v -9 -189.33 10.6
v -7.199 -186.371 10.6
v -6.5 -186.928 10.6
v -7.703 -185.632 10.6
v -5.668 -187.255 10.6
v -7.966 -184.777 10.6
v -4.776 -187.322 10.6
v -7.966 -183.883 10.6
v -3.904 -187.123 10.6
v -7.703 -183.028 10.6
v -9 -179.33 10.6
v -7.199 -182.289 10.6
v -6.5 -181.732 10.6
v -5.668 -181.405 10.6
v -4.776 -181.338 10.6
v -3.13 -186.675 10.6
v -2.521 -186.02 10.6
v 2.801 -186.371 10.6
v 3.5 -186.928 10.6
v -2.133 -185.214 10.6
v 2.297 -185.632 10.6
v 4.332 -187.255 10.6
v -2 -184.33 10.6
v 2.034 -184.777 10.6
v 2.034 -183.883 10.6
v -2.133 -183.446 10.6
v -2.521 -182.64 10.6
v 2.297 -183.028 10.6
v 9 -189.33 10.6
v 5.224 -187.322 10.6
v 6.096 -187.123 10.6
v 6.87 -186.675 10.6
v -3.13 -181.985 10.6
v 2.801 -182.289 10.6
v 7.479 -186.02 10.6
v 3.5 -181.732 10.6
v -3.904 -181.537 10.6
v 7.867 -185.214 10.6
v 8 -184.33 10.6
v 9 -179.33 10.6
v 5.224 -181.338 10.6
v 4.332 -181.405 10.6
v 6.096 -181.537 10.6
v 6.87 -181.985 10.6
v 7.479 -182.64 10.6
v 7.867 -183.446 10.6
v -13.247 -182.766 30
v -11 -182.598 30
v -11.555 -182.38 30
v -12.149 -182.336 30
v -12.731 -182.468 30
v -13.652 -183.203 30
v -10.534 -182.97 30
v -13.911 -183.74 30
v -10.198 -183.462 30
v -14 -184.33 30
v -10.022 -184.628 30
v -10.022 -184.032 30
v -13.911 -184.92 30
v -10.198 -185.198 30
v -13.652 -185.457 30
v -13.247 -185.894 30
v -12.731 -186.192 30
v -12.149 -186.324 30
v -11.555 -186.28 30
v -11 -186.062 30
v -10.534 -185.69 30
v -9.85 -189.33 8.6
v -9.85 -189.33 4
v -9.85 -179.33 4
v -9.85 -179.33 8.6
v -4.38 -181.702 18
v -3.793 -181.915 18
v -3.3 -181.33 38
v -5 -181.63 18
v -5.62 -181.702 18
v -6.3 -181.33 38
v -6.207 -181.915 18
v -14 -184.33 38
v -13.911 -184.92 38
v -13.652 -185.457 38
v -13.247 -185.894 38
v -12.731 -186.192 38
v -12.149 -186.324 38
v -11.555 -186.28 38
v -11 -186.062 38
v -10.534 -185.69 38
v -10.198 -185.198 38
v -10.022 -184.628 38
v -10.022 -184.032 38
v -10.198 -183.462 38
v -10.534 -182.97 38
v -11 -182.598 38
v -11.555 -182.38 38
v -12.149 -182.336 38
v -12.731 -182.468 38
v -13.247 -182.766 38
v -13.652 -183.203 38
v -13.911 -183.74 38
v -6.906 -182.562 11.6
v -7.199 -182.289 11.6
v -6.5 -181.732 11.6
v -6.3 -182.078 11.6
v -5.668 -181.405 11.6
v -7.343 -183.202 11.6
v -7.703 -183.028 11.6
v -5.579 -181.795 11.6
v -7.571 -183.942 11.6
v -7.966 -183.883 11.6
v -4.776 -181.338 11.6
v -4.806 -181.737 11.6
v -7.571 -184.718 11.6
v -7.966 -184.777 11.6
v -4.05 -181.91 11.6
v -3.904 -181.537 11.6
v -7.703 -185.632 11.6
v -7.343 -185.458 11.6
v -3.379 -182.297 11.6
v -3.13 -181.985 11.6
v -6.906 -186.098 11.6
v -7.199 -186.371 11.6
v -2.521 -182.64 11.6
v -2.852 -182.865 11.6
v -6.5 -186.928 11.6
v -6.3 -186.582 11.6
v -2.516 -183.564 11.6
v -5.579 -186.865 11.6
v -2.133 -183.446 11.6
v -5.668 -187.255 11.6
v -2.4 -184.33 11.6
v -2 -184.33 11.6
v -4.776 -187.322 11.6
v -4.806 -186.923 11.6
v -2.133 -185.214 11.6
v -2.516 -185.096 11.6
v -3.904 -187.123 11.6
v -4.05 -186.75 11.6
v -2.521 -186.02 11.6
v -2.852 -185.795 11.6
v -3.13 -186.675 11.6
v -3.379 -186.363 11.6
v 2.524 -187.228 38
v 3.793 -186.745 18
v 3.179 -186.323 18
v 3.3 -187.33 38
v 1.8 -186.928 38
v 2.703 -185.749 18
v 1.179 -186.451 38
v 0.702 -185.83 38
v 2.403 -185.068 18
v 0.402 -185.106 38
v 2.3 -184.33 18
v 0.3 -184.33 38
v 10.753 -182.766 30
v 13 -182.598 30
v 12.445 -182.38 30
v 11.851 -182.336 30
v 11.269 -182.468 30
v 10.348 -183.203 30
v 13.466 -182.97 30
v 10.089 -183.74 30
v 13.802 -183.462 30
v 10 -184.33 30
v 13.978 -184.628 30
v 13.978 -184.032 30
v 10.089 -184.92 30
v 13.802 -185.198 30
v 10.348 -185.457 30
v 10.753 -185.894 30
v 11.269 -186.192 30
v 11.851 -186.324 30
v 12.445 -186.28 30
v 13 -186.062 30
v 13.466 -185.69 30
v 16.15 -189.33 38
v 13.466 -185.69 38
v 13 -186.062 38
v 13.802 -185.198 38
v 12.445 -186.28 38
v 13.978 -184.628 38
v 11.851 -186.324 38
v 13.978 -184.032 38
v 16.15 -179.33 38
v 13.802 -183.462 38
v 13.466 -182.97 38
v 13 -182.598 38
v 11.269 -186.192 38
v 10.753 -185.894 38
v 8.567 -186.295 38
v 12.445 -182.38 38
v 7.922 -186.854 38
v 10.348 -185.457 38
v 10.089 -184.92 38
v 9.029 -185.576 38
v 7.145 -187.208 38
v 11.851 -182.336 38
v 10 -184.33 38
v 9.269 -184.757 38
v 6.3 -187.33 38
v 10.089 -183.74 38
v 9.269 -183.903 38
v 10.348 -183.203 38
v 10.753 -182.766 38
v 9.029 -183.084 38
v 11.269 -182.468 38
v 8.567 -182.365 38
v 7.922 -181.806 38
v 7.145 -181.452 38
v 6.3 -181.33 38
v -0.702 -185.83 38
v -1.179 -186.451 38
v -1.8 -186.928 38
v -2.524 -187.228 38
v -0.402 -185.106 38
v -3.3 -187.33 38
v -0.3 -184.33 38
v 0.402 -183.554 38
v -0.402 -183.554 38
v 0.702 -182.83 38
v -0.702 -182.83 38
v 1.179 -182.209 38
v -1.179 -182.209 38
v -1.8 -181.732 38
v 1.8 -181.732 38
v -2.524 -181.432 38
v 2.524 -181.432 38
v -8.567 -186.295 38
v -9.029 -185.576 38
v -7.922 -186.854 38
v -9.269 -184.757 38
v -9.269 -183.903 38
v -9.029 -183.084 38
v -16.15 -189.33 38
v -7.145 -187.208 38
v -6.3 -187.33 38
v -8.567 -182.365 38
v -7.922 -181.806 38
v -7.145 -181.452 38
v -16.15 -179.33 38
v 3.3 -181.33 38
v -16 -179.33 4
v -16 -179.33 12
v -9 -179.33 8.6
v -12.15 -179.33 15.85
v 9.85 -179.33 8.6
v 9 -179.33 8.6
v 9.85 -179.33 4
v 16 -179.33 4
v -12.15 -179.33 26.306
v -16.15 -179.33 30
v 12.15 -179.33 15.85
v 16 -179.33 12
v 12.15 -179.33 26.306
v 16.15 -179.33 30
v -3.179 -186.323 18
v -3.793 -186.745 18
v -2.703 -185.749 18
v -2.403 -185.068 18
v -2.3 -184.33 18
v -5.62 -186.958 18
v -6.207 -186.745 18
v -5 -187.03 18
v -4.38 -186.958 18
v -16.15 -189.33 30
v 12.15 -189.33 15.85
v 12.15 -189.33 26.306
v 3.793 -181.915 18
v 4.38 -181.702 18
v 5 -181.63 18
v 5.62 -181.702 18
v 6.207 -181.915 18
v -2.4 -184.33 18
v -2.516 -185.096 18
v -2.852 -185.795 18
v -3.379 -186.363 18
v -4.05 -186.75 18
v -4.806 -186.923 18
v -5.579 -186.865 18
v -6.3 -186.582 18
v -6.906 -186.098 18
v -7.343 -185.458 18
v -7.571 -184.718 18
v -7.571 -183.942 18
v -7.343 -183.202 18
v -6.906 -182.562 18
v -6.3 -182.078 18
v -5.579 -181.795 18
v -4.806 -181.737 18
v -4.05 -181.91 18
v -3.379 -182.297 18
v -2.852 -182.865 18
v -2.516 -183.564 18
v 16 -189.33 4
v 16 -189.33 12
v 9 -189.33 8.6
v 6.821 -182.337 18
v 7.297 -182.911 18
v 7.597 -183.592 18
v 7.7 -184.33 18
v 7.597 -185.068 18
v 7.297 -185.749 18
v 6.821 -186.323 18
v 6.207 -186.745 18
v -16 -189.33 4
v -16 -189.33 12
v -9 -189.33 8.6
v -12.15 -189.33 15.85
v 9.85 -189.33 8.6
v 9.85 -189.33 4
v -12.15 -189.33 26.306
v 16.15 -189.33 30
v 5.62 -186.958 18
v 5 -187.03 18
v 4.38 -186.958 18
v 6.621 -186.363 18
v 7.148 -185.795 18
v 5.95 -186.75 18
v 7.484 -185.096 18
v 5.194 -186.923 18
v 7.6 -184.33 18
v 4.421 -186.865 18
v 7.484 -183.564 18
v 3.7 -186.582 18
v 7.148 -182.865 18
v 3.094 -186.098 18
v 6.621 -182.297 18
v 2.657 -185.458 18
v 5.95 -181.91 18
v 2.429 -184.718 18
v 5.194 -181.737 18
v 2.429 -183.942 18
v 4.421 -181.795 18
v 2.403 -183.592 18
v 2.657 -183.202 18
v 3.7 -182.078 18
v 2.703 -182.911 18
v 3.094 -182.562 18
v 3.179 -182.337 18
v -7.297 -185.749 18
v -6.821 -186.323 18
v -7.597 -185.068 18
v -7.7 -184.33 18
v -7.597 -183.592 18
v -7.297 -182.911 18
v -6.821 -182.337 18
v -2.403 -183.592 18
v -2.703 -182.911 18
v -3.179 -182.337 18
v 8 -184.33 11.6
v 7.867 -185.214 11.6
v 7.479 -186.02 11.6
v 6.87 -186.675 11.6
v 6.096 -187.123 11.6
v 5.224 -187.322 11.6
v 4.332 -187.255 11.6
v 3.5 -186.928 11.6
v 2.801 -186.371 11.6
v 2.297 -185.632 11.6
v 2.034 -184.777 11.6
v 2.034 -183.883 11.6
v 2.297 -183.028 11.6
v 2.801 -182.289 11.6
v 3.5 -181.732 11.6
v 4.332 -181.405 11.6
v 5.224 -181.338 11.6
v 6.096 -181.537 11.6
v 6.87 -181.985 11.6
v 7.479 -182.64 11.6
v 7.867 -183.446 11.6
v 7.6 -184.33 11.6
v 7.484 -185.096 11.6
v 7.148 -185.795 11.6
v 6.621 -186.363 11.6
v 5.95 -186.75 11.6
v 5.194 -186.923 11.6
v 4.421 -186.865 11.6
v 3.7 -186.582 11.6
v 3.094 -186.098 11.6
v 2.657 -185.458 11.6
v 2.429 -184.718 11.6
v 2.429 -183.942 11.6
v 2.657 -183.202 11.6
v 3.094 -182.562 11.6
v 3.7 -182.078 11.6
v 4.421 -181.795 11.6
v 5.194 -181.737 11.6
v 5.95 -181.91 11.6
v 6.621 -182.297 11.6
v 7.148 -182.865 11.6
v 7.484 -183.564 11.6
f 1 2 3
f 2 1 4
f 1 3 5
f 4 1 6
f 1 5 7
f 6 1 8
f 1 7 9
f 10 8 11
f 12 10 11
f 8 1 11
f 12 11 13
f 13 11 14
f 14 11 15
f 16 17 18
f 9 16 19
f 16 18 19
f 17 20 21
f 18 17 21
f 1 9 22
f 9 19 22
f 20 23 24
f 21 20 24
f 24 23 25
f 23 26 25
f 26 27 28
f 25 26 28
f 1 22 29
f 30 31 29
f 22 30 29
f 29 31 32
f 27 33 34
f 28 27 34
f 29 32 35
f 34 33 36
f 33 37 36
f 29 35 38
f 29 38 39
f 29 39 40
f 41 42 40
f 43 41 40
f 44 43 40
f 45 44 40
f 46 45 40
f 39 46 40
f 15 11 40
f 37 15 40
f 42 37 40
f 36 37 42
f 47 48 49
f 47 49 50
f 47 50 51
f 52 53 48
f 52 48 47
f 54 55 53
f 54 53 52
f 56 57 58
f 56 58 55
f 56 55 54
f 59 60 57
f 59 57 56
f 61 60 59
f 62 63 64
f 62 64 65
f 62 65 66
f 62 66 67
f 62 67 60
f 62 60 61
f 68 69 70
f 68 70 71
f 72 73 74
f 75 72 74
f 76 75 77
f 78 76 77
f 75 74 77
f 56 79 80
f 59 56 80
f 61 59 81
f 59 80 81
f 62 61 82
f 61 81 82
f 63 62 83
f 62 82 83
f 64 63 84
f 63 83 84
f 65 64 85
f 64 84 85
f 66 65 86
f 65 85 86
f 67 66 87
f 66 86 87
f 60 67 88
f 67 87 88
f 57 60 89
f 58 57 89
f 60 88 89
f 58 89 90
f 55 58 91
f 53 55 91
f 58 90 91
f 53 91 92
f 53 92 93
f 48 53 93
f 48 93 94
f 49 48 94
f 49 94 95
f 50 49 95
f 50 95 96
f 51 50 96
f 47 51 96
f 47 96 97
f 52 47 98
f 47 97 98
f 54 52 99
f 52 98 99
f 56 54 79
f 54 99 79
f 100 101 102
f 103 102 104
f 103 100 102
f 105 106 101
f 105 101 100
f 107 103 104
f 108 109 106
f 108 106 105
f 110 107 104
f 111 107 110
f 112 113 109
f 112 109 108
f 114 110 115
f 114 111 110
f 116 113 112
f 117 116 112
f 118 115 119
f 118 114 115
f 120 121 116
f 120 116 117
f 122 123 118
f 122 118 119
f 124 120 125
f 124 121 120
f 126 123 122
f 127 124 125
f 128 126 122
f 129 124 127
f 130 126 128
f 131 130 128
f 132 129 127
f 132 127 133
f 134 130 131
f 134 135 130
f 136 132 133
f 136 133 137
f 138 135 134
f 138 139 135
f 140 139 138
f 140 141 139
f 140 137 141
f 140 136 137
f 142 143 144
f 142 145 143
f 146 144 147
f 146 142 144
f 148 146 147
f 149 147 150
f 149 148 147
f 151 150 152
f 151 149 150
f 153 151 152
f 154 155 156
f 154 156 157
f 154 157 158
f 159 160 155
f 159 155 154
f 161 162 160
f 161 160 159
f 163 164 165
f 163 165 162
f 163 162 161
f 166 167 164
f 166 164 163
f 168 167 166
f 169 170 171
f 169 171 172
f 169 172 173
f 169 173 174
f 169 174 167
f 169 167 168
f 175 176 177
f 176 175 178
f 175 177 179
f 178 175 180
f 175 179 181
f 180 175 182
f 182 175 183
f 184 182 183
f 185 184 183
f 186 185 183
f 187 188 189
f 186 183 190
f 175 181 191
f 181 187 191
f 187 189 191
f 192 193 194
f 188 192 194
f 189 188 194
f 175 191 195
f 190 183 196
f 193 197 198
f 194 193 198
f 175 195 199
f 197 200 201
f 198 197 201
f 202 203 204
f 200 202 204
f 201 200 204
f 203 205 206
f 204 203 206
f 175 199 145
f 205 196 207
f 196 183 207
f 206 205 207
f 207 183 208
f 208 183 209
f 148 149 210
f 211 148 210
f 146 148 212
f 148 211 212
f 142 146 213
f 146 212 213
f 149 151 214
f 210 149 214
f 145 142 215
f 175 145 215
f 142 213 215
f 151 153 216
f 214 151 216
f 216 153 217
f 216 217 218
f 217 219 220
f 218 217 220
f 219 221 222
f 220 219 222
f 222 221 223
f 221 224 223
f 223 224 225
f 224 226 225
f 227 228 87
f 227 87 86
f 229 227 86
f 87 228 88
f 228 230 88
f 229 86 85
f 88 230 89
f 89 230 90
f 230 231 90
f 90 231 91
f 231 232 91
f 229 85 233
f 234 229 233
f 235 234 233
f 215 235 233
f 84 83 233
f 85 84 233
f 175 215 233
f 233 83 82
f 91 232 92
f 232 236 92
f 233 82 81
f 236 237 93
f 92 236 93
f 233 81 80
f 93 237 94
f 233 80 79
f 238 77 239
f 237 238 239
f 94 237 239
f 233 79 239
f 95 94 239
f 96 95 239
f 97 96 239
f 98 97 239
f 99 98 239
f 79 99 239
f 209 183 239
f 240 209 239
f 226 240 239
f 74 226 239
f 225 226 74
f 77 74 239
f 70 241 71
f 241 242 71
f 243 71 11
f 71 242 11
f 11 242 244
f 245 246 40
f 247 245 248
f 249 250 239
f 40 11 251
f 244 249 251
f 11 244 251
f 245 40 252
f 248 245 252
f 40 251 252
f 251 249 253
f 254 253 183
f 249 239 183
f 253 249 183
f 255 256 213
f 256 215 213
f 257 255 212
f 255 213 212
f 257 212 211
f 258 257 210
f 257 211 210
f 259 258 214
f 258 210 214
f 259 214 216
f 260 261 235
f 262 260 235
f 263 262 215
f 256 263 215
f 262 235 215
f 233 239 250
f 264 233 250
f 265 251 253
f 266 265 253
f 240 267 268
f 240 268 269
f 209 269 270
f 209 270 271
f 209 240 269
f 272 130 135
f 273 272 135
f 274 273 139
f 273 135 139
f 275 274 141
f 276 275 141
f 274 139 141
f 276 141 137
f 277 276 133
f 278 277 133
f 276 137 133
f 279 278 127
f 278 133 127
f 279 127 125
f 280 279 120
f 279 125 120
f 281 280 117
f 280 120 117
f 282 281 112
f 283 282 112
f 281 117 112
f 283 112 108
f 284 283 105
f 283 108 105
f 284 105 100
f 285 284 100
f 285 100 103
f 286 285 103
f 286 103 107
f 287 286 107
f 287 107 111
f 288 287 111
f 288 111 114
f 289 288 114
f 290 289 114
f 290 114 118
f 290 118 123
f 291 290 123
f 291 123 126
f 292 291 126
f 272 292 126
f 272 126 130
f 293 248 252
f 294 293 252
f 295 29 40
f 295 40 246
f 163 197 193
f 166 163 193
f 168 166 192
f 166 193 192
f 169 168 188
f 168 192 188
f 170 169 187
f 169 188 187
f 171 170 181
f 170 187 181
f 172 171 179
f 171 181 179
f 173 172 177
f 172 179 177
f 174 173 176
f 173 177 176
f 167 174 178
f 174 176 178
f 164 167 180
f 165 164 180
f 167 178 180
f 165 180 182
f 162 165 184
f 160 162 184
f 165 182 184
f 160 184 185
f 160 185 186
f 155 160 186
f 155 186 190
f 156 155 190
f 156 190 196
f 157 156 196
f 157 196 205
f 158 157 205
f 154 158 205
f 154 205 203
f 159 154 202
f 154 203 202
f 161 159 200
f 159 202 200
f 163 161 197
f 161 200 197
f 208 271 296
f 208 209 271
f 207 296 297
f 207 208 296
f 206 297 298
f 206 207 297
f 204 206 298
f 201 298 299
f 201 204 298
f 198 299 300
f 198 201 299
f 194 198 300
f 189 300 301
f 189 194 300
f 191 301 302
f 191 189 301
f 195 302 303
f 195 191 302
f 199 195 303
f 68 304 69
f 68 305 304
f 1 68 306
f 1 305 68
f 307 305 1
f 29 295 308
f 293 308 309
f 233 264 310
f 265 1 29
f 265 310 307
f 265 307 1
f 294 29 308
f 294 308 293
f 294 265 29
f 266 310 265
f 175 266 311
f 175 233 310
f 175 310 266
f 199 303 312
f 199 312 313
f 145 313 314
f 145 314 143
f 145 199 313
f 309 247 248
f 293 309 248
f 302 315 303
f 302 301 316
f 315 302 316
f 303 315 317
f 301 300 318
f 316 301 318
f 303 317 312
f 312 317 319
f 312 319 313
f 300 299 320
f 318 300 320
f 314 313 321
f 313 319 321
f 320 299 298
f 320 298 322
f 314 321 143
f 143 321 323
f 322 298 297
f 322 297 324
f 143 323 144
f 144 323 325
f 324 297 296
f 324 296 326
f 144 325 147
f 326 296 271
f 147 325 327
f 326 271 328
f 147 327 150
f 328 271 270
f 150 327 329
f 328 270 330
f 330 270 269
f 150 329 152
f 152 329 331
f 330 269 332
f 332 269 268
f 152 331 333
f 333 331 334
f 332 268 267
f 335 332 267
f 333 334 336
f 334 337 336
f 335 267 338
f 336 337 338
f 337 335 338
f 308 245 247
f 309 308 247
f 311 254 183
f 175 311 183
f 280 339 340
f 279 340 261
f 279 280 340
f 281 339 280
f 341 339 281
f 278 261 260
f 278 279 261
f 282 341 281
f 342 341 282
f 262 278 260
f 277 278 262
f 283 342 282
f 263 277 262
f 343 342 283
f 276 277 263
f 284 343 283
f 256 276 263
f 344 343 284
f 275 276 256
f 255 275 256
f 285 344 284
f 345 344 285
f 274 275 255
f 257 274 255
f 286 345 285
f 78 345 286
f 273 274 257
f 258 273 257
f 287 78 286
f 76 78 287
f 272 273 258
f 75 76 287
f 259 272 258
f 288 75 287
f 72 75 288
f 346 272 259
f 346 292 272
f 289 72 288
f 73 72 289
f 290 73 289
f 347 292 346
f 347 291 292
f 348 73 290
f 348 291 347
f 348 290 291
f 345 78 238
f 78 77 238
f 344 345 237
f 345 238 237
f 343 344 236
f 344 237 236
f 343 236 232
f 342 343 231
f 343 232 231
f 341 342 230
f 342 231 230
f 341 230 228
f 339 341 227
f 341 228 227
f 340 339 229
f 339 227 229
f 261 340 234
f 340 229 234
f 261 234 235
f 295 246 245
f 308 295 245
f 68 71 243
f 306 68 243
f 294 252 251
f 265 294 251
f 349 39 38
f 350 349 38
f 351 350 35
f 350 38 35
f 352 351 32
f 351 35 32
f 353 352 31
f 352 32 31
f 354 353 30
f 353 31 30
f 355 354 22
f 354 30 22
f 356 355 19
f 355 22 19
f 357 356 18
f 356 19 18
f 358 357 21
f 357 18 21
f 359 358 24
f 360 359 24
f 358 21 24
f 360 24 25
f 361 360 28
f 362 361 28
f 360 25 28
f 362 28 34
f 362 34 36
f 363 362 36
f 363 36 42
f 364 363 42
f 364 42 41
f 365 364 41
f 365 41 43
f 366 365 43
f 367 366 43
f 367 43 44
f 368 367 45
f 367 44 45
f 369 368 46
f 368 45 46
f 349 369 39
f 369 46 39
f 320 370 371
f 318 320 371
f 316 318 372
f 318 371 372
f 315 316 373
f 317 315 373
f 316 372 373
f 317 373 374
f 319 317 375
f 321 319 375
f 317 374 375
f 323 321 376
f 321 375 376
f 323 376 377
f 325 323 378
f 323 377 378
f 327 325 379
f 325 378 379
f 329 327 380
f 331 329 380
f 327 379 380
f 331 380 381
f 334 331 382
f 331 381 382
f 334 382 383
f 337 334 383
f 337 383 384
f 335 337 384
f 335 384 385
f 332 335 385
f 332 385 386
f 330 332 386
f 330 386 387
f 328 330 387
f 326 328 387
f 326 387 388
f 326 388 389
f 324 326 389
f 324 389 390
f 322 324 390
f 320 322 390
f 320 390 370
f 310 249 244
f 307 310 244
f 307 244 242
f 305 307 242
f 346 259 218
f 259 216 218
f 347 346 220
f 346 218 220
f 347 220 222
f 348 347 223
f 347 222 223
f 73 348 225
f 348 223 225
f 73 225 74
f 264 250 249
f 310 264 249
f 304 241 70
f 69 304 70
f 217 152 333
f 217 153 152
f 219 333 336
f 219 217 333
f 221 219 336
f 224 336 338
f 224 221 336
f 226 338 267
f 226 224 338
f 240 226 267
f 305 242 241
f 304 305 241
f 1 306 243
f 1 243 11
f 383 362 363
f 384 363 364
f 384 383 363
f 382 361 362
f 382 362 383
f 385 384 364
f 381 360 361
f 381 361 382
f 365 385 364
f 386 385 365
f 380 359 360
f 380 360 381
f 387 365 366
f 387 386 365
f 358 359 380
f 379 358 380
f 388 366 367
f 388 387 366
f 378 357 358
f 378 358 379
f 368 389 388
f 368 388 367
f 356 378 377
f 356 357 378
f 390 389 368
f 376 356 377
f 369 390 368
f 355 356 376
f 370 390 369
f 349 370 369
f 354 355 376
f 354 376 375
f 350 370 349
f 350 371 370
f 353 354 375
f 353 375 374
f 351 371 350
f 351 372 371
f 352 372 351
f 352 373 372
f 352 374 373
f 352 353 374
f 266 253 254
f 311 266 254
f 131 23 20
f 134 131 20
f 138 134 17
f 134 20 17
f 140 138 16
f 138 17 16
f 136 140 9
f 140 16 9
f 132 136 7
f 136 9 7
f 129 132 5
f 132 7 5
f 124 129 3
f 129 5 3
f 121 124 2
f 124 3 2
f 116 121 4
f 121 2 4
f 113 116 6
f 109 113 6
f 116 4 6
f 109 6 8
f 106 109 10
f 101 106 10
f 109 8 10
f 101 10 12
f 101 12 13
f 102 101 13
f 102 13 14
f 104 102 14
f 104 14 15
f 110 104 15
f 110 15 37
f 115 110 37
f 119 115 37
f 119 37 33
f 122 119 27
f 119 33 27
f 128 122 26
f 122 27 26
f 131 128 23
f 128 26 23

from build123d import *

# Parameters (mm, degrees)
SKETCH072_R     = 2.7
PAD031_DEPTH    = 10
SKETCH069_R     = 2.6
POCKET028_DEPTH = 8
SKETCH070_R     = 3
POCKET029_DEPTH = 1
SKETCH073_R     = 2
POCKET030_DEPTH = 8


with BuildPart() as loft004:
    # Sketch072 → Loft004 section 0
    with BuildSketch(Plane.XY.offset(18)):
        with Locations((-5, 0)):
            Circle(SKETCH072_R)
    # Sketch071 → Loft004 section 1
    with BuildSketch(Plane.XY.offset(38)):
        with BuildLine():
            ThreePointArc((-6.3, 3), (-9.3, 0), (-6.3, -3))
            Line((-6.3, -3), (-3.3, -3))
            ThreePointArc((-3.3, -3), (-0.3, 0), (-3.3, 3))
            Line((-3.3, 3), (-6.3, 3))
        make_face()
    loft()


with BuildPart() as part_mirroring004:
    # Part__Mirroring004: instance of Loft004
    add(loft004.part.mirror(Plane(origin=(0, 0, 0), x_dir=(0, -1, 0), z_dir=(1, 0, 0))))


with BuildPart() as fusion004:
    # Fusion004 base: copy of Loft004
    add(loft004.part)

    # Fusion004: union Part__Mirroring004
    add(part_mirroring004.part)


with BuildPart() as cut003:
    # Sketch068 → Pad031 (new body)
    with BuildSketch(Plane.XZ):
        Polygon((-16, 4), (-9.85, 4), (-9.85, 7), (-9.85, 8.6), (-9, 8.6), (-9, 10.6), (9, 10.6), (9, 8.6), (9.85, 8.6), (9.85, 7), (9.85, 4), (16, 4), (16, 12), (12.15, 15.85), (12.15, 26.306086), (16.15, 30), (16.15, 38), (-16.15, 38), (-16.15, 30), (-12.15, 26.306086), (-12.15, 15.85), (-16, 12), align=None)
    extrude(amount=PAD031_DEPTH)

    # Sketch069 (on Face7 of Pad031) → Pocket028 (cut)
    with BuildSketch(Plane(origin=(0, 0, 10.6), x_dir=(1, 0, 0), z_dir=(0, 0, -1))):
        with Locations((-5, 5)):
            Circle(SKETCH069_R)
        with Locations((5, 5)):
            Circle(SKETCH069_R)
    extrude(amount=-POCKET028_DEPTH, mode=Mode.SUBTRACT)

    # Sketch070 (on Face11 of Pocket028) → Pocket029 (cut)
    with BuildSketch(Plane(origin=(0, 0, 10.6), x_dir=(1, 0, 0), z_dir=(0, 0, -1))):
        with Locations((-5, 5)):
            Circle(SKETCH070_R)
        with Locations((5, 5)):
            Circle(SKETCH070_R)
    extrude(amount=-POCKET029_DEPTH, mode=Mode.SUBTRACT)

    # Sketch073 (on Face22 of Pocket029) → Pocket030 (cut)
    with BuildSketch(Plane(origin=(0, 0, 38), x_dir=(-1, 0, 0), z_dir=(0, 0, 1))):
        with Locations((-12, 5)):
            Circle(SKETCH073_R)
        with Locations((12, 5)):
            Circle(SKETCH073_R)
    extrude(amount=-POCKET030_DEPTH, mode=Mode.SUBTRACT)


with BuildPart() as cut003_1:
    # Body025 placement: moved
    add(cut003.part.moved(Location((0, 5, 0))))

    # Cut003: cut Fusion004
    add(fusion004.part, mode=Mode.SUBTRACT)


with BuildPart() as cut003_2:
    # Cut003 placement: moved
    add(cut003_1.part.moved(Location((0, -184.33, 0))))


solid = cut003_2.part
